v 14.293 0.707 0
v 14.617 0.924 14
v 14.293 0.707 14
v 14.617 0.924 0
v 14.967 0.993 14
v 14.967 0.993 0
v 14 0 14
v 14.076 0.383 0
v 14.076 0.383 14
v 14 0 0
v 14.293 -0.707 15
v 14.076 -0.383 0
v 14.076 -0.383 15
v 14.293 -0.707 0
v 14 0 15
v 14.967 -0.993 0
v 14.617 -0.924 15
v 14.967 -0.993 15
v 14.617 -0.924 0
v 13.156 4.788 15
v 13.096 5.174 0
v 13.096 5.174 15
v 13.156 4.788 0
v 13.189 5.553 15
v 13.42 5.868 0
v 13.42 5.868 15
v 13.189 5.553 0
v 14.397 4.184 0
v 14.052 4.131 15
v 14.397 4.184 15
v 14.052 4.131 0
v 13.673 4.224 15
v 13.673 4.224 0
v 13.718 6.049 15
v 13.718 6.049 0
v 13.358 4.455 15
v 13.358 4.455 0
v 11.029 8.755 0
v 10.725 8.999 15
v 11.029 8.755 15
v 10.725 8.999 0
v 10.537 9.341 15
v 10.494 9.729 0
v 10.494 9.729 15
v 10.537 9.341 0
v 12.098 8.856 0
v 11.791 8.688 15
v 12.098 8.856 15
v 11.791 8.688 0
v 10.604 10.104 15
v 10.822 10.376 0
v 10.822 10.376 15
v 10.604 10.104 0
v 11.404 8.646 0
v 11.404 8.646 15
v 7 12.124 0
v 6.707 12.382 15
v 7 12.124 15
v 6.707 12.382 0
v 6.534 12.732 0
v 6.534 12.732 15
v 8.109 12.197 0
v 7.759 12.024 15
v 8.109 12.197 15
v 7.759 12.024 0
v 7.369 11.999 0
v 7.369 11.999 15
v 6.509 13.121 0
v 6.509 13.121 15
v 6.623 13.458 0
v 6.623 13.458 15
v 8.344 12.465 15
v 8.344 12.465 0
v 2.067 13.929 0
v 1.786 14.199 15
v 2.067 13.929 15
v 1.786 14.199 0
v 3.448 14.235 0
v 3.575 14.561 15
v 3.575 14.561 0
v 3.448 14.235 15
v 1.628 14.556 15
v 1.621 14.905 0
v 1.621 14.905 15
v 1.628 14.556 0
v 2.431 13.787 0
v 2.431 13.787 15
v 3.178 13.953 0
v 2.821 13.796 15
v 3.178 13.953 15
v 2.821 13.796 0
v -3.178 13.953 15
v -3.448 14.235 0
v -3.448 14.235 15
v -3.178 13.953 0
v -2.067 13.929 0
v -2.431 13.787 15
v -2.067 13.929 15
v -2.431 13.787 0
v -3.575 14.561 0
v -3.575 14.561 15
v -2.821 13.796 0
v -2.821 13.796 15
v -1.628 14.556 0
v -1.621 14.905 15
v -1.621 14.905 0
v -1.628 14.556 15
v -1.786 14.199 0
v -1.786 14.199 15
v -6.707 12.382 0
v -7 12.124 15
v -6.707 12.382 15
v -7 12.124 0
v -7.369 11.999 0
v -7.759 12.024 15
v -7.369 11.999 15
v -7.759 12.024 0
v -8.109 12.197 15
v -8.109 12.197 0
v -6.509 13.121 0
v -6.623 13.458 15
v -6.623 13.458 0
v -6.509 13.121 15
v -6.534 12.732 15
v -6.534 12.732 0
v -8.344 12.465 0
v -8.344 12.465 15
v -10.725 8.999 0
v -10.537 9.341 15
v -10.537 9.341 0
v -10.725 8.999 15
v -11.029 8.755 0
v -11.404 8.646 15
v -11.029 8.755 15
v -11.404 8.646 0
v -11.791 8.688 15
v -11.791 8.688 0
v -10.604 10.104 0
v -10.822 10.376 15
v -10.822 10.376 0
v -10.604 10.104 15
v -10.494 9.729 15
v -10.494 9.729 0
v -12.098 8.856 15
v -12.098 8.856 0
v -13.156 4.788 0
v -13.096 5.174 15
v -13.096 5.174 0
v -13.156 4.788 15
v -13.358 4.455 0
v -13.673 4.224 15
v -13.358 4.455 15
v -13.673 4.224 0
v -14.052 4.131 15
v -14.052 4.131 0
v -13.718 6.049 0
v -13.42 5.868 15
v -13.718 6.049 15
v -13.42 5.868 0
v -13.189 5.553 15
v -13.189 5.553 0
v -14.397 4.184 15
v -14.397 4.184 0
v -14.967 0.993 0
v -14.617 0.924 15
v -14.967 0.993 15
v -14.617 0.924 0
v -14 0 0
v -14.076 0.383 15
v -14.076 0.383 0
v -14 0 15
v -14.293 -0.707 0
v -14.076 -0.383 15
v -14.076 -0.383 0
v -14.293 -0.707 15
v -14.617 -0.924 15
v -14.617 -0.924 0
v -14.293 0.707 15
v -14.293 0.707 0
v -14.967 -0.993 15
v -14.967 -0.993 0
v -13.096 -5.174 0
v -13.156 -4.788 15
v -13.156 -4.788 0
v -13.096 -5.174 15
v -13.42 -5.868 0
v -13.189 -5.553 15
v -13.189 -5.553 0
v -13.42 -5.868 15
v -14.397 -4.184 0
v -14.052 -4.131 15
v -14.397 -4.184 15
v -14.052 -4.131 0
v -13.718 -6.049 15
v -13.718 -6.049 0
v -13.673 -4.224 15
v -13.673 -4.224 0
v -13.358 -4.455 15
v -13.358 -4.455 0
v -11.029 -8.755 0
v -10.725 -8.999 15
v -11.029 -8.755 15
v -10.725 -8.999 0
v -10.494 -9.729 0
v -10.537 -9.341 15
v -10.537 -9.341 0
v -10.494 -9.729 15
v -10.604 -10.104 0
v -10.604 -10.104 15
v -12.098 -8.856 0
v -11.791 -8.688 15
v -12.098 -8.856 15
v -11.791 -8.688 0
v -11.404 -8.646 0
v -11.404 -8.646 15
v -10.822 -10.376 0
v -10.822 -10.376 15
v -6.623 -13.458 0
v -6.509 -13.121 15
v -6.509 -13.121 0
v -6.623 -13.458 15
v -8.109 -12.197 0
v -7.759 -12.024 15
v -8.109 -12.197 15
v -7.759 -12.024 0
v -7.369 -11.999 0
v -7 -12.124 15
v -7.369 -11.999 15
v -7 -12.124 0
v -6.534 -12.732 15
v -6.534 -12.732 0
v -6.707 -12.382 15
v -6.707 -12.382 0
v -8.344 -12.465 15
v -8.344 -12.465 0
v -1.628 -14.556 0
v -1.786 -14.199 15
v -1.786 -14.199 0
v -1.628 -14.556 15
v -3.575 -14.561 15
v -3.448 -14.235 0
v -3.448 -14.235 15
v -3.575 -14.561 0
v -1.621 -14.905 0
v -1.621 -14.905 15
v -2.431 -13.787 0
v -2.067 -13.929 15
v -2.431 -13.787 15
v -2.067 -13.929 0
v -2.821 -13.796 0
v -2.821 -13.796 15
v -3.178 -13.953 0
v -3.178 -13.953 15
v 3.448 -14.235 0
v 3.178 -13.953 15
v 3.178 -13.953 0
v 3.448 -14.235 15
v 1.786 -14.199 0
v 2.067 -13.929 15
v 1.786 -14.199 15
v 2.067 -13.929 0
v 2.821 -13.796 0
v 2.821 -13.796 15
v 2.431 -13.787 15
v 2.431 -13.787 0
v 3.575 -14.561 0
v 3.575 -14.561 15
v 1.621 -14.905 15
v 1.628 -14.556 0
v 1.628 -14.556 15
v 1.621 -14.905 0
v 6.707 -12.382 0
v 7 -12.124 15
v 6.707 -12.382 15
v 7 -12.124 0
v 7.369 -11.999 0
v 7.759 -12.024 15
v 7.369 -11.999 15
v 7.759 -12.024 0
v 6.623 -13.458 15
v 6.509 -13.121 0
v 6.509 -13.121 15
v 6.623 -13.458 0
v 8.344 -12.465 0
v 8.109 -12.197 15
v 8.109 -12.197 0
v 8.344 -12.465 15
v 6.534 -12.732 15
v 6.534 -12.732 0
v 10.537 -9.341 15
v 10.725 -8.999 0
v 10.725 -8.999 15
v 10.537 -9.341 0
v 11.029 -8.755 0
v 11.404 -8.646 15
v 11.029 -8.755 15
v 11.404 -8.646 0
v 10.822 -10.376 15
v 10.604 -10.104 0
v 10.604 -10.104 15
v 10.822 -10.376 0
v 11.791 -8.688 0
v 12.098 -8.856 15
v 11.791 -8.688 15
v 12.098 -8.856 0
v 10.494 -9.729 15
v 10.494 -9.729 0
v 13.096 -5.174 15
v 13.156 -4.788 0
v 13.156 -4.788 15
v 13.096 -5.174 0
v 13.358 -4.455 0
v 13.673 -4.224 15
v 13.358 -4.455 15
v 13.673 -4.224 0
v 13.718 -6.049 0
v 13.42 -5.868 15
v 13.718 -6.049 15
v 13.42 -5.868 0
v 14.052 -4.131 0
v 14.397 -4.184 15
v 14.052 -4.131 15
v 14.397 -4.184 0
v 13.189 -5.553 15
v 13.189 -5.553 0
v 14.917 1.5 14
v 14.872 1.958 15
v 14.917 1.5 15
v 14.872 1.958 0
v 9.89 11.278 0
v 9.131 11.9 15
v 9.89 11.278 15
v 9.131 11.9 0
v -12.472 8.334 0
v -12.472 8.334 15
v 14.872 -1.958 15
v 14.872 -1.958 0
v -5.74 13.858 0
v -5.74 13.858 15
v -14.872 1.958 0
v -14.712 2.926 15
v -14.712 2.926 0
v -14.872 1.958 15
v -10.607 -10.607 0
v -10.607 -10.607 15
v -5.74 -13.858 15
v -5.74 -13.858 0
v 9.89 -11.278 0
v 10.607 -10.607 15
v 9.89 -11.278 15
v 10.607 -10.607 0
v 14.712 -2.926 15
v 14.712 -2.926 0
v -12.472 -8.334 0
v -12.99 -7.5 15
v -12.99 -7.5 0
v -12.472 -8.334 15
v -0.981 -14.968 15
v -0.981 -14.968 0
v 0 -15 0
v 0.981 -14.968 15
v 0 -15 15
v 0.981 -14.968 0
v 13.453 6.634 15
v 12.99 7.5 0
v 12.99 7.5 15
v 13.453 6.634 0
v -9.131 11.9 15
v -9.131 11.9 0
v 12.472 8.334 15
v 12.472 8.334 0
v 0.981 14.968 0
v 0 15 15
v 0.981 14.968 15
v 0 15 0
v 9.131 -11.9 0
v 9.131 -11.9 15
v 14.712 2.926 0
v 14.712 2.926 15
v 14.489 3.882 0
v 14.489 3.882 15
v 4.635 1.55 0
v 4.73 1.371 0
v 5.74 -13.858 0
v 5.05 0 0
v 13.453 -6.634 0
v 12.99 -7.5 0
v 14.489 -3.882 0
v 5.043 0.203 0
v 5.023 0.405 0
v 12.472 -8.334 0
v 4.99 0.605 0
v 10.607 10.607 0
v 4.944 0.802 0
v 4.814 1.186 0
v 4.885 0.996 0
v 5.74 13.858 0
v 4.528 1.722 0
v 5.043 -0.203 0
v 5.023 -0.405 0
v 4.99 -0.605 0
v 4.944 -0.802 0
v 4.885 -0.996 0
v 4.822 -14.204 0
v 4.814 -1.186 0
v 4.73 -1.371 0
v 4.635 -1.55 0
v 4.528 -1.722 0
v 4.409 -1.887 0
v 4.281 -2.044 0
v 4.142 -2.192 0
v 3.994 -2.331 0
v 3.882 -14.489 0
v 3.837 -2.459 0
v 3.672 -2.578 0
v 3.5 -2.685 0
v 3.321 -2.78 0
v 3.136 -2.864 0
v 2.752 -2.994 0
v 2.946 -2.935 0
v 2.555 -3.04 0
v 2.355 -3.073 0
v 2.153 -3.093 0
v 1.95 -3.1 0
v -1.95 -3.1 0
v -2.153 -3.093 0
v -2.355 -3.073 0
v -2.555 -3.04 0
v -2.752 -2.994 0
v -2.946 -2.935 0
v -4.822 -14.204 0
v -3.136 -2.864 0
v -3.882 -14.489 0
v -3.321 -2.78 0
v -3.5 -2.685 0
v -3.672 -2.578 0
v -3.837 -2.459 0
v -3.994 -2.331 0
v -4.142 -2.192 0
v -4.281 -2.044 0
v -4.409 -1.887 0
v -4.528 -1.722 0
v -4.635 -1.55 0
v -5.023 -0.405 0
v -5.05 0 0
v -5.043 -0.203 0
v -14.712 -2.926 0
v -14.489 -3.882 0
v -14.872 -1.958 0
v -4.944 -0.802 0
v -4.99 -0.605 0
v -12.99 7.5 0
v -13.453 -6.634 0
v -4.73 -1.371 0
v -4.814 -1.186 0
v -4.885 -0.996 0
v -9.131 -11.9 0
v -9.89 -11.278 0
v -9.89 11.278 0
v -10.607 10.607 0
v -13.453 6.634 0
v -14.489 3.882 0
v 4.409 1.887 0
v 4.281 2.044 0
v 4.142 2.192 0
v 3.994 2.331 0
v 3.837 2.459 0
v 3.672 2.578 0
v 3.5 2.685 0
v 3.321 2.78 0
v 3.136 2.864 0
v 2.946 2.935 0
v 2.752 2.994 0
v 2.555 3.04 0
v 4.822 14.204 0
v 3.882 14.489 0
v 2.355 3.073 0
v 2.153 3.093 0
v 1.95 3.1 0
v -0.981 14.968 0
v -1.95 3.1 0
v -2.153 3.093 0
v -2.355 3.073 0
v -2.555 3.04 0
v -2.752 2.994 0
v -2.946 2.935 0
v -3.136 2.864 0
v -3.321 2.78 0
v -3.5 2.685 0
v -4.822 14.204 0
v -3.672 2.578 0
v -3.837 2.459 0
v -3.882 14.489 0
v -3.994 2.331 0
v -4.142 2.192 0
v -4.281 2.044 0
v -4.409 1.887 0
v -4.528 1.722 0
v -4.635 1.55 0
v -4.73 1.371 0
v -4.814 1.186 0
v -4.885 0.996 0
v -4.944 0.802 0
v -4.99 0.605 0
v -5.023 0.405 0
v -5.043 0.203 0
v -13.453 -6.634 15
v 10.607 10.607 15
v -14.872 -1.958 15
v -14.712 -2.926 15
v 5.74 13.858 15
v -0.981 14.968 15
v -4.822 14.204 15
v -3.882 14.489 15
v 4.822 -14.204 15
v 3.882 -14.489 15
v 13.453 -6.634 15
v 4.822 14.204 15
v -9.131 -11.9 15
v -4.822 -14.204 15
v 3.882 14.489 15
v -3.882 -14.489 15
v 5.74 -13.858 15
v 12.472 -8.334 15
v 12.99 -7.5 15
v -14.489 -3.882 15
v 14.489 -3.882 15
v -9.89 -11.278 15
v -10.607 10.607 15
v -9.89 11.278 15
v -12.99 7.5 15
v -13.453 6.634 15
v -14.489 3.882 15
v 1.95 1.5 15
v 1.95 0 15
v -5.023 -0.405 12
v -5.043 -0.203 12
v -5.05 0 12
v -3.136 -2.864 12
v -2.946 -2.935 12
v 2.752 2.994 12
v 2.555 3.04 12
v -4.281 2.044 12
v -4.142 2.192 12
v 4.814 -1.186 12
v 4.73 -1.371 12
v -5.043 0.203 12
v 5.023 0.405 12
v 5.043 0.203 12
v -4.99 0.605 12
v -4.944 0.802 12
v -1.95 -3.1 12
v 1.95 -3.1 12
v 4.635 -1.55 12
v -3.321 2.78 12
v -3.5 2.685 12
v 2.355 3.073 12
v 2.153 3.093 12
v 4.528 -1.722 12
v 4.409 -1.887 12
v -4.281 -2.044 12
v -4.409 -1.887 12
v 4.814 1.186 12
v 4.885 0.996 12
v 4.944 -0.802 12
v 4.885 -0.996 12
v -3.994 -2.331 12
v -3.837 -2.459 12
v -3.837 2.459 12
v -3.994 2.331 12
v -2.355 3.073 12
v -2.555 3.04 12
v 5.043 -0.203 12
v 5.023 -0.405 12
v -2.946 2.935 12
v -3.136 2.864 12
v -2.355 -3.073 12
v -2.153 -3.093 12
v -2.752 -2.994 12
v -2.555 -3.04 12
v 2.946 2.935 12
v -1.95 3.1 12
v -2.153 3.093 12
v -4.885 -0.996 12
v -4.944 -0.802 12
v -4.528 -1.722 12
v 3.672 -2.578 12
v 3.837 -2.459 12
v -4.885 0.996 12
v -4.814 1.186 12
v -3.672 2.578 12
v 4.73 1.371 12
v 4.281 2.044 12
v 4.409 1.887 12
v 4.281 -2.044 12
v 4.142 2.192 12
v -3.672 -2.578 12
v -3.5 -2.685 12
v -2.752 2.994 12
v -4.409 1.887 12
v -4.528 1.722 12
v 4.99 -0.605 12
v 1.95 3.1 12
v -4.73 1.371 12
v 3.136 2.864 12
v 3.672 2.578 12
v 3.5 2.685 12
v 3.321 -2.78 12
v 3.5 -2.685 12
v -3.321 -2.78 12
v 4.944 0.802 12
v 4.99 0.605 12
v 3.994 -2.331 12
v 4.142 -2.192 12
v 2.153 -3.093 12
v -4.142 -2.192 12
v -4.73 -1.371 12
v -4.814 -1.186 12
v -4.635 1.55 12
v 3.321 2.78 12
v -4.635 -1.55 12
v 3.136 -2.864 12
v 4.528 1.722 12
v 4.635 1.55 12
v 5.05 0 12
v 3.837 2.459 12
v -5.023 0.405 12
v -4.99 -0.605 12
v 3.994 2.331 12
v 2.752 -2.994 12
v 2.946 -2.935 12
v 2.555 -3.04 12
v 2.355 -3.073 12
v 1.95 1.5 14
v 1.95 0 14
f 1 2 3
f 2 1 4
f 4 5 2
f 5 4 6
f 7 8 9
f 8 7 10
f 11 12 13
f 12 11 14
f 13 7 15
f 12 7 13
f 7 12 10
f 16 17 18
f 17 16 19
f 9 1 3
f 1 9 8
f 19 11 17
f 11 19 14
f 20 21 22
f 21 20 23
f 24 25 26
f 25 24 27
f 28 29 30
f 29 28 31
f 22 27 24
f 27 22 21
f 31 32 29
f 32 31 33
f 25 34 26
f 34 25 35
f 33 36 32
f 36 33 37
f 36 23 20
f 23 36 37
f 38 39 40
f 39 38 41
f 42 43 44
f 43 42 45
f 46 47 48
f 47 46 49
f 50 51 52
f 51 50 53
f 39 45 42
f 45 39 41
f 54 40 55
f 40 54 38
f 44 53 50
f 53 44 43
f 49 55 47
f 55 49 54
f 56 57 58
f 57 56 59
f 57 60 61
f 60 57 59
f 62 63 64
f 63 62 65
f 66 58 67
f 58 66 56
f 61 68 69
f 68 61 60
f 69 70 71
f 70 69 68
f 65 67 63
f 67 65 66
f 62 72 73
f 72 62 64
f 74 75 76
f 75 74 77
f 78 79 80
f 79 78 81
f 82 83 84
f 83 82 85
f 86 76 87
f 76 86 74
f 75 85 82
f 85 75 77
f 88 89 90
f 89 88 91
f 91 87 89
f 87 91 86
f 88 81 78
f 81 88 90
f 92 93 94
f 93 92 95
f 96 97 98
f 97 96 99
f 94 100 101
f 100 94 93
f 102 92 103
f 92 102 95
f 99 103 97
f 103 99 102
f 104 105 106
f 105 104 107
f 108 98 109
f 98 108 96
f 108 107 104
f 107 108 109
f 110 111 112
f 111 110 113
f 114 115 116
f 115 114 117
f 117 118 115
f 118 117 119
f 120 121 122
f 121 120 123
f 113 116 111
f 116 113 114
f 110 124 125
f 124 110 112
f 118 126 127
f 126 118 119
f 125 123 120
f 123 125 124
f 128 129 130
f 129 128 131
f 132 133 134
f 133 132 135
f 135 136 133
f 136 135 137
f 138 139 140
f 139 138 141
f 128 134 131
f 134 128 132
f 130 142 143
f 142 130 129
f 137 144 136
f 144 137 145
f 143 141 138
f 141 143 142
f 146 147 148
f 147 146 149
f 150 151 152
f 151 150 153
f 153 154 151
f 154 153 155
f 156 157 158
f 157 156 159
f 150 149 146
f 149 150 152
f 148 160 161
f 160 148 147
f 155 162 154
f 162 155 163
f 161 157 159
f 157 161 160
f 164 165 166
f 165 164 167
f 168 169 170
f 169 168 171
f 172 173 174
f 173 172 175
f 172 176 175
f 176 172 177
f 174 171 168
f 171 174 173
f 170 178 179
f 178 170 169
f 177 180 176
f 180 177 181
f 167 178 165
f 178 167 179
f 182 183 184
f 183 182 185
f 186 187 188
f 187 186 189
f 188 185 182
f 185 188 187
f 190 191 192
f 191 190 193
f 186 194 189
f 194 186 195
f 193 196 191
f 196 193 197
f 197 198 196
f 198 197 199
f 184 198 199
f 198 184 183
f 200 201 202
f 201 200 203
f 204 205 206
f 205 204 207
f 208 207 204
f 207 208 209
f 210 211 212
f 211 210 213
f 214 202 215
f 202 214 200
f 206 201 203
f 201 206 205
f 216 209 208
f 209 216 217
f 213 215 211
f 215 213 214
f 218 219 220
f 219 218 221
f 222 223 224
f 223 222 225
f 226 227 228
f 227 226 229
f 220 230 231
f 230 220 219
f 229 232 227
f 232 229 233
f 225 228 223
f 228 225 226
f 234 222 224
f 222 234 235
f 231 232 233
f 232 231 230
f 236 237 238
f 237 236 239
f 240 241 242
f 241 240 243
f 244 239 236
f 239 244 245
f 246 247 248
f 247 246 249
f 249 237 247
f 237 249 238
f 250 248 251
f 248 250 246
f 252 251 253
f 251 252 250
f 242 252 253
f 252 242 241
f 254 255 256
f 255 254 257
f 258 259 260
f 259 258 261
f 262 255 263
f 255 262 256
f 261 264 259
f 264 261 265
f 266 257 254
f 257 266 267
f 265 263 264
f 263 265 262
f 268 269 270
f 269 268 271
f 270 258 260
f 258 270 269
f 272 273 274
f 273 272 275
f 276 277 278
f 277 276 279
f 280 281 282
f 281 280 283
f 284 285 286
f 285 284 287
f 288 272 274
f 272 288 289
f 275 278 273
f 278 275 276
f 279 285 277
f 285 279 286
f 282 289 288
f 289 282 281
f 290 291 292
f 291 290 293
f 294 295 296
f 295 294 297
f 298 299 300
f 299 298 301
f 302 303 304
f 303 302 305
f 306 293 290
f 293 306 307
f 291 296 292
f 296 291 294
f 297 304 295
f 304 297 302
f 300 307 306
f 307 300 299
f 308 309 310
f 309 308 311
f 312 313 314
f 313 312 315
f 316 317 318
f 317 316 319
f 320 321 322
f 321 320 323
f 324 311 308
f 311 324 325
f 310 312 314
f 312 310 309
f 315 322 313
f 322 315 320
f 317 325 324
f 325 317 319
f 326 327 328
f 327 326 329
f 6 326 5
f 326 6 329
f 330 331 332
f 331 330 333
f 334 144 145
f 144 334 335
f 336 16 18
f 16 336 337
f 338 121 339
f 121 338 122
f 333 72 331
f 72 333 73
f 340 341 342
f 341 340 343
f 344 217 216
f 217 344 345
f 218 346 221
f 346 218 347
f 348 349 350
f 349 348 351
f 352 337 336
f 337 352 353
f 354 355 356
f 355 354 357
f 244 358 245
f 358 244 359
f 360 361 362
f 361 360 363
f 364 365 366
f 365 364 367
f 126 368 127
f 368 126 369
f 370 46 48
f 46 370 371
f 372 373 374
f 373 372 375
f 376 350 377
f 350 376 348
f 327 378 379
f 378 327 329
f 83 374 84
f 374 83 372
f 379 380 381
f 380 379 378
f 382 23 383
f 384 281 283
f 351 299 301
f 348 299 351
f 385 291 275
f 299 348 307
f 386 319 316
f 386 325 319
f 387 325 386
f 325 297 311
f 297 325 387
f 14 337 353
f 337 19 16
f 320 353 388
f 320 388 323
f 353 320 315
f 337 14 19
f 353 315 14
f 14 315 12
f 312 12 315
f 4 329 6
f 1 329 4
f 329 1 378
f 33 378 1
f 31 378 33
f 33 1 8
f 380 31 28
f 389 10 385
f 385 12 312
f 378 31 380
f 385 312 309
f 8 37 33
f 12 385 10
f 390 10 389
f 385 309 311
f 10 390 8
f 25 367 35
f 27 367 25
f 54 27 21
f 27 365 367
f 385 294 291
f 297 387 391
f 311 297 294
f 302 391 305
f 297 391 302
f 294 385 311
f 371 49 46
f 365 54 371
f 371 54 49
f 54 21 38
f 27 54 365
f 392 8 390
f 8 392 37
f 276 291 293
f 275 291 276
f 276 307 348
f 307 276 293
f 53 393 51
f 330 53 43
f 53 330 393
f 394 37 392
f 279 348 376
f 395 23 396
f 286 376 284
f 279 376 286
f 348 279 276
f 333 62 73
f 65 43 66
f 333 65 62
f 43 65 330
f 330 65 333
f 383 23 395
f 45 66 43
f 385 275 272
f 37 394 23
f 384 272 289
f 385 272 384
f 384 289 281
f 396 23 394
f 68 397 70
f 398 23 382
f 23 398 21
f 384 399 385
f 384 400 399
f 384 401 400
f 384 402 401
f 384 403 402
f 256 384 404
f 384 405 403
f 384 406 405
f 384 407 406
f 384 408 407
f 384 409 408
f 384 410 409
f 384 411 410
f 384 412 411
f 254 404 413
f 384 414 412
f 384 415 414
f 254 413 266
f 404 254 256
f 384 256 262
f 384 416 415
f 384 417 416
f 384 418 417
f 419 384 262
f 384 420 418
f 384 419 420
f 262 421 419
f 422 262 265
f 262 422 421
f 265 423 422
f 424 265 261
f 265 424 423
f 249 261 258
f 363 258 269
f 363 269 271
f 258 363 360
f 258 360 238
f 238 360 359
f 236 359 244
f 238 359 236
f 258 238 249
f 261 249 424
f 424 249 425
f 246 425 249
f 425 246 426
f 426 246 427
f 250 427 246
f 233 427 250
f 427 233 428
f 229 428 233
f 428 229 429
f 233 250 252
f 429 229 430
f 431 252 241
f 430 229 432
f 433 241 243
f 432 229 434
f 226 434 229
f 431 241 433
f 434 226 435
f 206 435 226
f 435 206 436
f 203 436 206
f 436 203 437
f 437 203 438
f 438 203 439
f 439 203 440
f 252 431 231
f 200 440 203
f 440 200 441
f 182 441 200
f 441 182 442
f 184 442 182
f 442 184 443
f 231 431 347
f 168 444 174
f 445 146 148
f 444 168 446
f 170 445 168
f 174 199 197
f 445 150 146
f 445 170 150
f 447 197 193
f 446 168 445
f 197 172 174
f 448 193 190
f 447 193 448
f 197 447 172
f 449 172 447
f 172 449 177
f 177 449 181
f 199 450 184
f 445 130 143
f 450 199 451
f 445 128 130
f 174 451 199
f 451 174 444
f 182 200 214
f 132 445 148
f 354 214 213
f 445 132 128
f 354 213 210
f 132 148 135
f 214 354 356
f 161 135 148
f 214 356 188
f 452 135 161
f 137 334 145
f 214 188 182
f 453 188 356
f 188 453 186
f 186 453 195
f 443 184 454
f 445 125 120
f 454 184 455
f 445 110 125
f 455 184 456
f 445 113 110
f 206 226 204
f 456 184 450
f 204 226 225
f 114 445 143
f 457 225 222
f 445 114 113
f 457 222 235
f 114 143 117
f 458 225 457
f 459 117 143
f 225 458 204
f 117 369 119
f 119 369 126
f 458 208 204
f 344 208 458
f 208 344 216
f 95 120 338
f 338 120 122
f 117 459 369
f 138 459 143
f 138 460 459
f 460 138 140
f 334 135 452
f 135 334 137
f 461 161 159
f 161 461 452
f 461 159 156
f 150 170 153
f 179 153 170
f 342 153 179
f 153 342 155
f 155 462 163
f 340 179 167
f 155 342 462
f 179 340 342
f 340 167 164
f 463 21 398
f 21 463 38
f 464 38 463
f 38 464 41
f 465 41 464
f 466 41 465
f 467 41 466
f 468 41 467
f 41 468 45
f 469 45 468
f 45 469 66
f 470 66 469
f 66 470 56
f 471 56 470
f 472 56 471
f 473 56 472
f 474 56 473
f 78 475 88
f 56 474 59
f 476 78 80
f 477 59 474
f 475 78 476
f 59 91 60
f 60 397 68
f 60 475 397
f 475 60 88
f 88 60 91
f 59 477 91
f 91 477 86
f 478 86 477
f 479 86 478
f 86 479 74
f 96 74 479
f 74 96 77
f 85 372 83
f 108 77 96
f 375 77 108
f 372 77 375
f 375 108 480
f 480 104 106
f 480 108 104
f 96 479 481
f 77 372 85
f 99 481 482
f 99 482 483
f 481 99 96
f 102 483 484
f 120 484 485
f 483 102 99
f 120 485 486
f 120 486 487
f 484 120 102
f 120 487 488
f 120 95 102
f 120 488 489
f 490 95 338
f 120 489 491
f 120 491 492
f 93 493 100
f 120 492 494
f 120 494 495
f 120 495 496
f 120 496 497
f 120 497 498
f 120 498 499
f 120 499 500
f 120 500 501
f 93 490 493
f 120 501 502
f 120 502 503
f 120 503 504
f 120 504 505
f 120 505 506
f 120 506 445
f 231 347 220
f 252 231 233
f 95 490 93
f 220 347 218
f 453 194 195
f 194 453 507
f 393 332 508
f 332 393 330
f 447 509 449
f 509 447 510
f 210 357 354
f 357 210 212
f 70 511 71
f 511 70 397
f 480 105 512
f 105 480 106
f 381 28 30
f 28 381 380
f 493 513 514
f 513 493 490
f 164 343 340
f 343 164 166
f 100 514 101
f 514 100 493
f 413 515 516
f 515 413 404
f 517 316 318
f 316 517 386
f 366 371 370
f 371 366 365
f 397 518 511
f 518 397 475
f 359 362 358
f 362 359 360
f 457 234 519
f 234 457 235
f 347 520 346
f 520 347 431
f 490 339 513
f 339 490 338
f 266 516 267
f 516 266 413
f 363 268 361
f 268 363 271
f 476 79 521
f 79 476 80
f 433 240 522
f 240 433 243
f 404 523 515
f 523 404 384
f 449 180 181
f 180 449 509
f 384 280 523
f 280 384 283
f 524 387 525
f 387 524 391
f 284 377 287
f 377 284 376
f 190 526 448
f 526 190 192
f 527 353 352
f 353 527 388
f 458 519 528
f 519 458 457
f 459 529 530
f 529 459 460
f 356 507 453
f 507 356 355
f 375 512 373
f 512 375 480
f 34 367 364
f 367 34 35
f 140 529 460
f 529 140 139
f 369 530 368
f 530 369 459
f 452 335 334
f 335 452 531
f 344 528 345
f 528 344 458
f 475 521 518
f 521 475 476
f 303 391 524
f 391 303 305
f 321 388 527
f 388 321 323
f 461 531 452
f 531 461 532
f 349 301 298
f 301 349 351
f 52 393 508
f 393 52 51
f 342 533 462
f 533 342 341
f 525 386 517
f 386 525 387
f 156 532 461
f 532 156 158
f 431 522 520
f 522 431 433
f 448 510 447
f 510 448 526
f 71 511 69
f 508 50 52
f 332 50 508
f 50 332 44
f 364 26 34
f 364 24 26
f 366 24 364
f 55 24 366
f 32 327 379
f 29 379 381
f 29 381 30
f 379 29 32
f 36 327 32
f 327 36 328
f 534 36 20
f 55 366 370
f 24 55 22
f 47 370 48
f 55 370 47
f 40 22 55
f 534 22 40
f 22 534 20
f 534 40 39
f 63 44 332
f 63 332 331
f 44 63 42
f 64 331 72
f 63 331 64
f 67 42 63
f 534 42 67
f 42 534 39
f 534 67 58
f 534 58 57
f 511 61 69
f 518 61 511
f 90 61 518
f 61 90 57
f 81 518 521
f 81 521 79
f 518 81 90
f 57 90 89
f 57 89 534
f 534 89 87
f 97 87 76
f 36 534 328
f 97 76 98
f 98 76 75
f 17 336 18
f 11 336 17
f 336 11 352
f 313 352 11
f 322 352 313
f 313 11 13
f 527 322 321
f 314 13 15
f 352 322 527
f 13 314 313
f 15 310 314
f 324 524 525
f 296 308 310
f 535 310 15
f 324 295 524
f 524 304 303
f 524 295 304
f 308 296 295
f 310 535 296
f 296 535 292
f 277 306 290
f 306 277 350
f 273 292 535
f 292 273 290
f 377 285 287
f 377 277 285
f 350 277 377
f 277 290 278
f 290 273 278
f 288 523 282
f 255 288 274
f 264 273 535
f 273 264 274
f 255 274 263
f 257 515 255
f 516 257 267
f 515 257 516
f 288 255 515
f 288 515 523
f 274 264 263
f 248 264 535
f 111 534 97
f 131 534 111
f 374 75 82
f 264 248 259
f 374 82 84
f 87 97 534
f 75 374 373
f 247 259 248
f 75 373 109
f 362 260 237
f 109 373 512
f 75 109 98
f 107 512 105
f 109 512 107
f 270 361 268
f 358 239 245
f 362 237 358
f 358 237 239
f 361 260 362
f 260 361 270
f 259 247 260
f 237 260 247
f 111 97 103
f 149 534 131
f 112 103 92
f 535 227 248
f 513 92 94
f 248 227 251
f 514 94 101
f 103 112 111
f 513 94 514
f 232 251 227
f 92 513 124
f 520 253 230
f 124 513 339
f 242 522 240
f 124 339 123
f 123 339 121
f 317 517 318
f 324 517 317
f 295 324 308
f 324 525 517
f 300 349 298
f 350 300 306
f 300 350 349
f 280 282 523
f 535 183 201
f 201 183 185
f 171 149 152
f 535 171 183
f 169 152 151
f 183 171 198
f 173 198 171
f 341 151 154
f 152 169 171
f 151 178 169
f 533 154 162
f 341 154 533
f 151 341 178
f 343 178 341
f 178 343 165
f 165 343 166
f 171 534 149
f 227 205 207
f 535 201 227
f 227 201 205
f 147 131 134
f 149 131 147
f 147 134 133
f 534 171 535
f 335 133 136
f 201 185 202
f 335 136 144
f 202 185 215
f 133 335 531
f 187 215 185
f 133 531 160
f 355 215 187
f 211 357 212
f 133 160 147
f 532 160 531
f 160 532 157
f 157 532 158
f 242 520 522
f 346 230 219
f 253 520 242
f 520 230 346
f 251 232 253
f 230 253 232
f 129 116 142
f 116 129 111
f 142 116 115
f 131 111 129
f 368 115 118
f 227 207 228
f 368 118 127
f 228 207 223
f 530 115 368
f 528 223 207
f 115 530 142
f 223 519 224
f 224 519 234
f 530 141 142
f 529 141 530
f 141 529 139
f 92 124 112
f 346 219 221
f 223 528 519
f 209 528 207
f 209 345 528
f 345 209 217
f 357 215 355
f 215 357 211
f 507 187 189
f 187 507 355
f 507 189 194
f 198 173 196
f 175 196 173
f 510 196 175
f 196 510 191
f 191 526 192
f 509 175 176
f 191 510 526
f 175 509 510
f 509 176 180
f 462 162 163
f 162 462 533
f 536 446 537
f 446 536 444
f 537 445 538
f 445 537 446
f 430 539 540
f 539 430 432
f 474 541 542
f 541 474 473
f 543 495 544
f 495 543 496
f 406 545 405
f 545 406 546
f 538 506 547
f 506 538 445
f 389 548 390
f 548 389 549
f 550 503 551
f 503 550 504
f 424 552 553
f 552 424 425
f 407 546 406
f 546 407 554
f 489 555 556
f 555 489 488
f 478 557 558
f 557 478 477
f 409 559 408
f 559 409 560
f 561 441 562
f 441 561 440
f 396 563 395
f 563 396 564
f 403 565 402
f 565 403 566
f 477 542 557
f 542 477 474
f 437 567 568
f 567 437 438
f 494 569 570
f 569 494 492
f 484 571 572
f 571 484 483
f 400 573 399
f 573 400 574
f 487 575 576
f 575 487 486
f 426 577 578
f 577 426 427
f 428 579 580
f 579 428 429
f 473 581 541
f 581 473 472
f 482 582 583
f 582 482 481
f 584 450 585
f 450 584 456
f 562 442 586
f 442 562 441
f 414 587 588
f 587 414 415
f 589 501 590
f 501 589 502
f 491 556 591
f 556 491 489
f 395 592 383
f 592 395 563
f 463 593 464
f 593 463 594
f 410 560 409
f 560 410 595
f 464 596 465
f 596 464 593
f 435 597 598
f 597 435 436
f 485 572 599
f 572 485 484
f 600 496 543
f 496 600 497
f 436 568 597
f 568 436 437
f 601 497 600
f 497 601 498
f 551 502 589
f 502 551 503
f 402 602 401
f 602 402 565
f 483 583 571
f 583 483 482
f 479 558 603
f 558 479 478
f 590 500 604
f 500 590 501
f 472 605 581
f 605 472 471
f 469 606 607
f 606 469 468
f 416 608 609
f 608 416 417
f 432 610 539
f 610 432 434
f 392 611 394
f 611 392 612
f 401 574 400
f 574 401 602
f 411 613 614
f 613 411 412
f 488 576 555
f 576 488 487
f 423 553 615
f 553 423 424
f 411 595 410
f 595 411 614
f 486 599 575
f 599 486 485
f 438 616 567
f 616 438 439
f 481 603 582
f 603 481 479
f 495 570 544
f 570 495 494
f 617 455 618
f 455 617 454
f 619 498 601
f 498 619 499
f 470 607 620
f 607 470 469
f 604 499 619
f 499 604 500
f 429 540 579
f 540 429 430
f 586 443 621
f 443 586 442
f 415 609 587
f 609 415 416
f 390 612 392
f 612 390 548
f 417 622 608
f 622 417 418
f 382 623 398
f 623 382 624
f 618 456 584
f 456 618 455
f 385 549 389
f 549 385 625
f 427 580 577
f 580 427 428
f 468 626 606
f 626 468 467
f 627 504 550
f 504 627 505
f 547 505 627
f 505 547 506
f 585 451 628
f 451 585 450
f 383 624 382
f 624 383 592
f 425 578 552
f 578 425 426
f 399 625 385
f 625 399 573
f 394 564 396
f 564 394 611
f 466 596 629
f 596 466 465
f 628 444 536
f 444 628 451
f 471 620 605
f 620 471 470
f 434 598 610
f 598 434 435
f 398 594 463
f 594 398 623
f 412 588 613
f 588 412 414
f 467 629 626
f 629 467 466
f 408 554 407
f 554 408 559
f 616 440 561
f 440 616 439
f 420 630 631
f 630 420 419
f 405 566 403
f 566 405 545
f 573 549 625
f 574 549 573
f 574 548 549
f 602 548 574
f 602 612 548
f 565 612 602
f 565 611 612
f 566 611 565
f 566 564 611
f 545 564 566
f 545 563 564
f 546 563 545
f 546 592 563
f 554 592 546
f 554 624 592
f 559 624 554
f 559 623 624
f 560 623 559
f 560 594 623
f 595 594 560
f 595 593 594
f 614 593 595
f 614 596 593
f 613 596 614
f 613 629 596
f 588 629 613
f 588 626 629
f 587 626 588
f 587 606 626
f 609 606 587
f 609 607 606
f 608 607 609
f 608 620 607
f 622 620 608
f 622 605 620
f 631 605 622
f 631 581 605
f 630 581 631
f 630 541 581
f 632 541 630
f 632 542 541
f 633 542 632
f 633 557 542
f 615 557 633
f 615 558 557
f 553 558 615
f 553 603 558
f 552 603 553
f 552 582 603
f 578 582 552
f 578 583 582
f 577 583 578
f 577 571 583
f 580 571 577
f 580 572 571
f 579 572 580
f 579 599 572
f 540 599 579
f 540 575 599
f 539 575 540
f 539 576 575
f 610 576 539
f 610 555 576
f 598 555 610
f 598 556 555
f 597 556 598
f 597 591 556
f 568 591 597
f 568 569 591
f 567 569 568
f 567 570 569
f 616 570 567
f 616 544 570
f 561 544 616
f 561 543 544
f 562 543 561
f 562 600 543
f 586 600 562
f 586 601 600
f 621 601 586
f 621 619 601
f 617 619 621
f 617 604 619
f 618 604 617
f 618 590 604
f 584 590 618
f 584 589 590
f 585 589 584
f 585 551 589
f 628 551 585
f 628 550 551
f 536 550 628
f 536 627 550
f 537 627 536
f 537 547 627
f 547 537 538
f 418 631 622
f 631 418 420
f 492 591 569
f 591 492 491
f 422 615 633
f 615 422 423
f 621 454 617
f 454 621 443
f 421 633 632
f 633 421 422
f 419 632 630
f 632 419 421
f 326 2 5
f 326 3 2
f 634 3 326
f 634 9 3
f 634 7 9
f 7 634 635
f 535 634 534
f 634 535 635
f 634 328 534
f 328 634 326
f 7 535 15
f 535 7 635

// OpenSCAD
// Replacement knob for a hotplate stirrer with a 6 mm D-shaft
// Print orientation: bottom face (with shaft bore) on the bed, z = 0

$fn = 96;

// --- Knob dimensions ---
knob_d      = 30;    // knob diameter
knob_h      = 15;    // knob height

// --- Shaft bore ---
shaft_d     = 6.2;   // D-shaft bore diameter
shaft_depth = 12;    // blind bore depth from bottom face
flat_offset = 1.95;  // distance from flat side to circle centre (so flat-to-opposite side = 4.7)

// --- Grip grooves ---
groove_count = 18;   // number of vertical grip grooves
groove_d     = 2;    // groove diameter (half-cylinder)

// --- Pointer groove ---
pointer_w   = 1.5;   // pointer groove width
pointer_d   = 1;     // pointer groove depth

// --- Cutting overlap ---
eps = 0.5;           // extension past faces to avoid coplanar surfaces

difference() {
    // Main body
    cylinder(d = knob_d, h = knob_h);

    // D-shaped blind bore from bottom face
    translate([0, 0, -eps])
        linear_extrude(height = shaft_depth + eps)
            hull() {
                translate([flat_offset, 0, 0]) circle(d = shaft_d);
                translate([-flat_offset, 0, 0]) circle(d = shaft_d);
            }

    // Vertical grip grooves along full height, centred on outer surface
    for (i = [0 : groove_count - 1])
        rotate([0, 0, i * 360 / groove_count])
            translate([knob_d / 2, 0, -eps])
                cylinder(d = groove_d, h = knob_h + 2 * eps, $fn = 16);

    // Pointer groove from centre to outer edge on top face, same side as flat
    translate([flat_offset, 0, knob_h - pointer_d])
        cube([knob_d, pointer_w, pointer_d]);
}
